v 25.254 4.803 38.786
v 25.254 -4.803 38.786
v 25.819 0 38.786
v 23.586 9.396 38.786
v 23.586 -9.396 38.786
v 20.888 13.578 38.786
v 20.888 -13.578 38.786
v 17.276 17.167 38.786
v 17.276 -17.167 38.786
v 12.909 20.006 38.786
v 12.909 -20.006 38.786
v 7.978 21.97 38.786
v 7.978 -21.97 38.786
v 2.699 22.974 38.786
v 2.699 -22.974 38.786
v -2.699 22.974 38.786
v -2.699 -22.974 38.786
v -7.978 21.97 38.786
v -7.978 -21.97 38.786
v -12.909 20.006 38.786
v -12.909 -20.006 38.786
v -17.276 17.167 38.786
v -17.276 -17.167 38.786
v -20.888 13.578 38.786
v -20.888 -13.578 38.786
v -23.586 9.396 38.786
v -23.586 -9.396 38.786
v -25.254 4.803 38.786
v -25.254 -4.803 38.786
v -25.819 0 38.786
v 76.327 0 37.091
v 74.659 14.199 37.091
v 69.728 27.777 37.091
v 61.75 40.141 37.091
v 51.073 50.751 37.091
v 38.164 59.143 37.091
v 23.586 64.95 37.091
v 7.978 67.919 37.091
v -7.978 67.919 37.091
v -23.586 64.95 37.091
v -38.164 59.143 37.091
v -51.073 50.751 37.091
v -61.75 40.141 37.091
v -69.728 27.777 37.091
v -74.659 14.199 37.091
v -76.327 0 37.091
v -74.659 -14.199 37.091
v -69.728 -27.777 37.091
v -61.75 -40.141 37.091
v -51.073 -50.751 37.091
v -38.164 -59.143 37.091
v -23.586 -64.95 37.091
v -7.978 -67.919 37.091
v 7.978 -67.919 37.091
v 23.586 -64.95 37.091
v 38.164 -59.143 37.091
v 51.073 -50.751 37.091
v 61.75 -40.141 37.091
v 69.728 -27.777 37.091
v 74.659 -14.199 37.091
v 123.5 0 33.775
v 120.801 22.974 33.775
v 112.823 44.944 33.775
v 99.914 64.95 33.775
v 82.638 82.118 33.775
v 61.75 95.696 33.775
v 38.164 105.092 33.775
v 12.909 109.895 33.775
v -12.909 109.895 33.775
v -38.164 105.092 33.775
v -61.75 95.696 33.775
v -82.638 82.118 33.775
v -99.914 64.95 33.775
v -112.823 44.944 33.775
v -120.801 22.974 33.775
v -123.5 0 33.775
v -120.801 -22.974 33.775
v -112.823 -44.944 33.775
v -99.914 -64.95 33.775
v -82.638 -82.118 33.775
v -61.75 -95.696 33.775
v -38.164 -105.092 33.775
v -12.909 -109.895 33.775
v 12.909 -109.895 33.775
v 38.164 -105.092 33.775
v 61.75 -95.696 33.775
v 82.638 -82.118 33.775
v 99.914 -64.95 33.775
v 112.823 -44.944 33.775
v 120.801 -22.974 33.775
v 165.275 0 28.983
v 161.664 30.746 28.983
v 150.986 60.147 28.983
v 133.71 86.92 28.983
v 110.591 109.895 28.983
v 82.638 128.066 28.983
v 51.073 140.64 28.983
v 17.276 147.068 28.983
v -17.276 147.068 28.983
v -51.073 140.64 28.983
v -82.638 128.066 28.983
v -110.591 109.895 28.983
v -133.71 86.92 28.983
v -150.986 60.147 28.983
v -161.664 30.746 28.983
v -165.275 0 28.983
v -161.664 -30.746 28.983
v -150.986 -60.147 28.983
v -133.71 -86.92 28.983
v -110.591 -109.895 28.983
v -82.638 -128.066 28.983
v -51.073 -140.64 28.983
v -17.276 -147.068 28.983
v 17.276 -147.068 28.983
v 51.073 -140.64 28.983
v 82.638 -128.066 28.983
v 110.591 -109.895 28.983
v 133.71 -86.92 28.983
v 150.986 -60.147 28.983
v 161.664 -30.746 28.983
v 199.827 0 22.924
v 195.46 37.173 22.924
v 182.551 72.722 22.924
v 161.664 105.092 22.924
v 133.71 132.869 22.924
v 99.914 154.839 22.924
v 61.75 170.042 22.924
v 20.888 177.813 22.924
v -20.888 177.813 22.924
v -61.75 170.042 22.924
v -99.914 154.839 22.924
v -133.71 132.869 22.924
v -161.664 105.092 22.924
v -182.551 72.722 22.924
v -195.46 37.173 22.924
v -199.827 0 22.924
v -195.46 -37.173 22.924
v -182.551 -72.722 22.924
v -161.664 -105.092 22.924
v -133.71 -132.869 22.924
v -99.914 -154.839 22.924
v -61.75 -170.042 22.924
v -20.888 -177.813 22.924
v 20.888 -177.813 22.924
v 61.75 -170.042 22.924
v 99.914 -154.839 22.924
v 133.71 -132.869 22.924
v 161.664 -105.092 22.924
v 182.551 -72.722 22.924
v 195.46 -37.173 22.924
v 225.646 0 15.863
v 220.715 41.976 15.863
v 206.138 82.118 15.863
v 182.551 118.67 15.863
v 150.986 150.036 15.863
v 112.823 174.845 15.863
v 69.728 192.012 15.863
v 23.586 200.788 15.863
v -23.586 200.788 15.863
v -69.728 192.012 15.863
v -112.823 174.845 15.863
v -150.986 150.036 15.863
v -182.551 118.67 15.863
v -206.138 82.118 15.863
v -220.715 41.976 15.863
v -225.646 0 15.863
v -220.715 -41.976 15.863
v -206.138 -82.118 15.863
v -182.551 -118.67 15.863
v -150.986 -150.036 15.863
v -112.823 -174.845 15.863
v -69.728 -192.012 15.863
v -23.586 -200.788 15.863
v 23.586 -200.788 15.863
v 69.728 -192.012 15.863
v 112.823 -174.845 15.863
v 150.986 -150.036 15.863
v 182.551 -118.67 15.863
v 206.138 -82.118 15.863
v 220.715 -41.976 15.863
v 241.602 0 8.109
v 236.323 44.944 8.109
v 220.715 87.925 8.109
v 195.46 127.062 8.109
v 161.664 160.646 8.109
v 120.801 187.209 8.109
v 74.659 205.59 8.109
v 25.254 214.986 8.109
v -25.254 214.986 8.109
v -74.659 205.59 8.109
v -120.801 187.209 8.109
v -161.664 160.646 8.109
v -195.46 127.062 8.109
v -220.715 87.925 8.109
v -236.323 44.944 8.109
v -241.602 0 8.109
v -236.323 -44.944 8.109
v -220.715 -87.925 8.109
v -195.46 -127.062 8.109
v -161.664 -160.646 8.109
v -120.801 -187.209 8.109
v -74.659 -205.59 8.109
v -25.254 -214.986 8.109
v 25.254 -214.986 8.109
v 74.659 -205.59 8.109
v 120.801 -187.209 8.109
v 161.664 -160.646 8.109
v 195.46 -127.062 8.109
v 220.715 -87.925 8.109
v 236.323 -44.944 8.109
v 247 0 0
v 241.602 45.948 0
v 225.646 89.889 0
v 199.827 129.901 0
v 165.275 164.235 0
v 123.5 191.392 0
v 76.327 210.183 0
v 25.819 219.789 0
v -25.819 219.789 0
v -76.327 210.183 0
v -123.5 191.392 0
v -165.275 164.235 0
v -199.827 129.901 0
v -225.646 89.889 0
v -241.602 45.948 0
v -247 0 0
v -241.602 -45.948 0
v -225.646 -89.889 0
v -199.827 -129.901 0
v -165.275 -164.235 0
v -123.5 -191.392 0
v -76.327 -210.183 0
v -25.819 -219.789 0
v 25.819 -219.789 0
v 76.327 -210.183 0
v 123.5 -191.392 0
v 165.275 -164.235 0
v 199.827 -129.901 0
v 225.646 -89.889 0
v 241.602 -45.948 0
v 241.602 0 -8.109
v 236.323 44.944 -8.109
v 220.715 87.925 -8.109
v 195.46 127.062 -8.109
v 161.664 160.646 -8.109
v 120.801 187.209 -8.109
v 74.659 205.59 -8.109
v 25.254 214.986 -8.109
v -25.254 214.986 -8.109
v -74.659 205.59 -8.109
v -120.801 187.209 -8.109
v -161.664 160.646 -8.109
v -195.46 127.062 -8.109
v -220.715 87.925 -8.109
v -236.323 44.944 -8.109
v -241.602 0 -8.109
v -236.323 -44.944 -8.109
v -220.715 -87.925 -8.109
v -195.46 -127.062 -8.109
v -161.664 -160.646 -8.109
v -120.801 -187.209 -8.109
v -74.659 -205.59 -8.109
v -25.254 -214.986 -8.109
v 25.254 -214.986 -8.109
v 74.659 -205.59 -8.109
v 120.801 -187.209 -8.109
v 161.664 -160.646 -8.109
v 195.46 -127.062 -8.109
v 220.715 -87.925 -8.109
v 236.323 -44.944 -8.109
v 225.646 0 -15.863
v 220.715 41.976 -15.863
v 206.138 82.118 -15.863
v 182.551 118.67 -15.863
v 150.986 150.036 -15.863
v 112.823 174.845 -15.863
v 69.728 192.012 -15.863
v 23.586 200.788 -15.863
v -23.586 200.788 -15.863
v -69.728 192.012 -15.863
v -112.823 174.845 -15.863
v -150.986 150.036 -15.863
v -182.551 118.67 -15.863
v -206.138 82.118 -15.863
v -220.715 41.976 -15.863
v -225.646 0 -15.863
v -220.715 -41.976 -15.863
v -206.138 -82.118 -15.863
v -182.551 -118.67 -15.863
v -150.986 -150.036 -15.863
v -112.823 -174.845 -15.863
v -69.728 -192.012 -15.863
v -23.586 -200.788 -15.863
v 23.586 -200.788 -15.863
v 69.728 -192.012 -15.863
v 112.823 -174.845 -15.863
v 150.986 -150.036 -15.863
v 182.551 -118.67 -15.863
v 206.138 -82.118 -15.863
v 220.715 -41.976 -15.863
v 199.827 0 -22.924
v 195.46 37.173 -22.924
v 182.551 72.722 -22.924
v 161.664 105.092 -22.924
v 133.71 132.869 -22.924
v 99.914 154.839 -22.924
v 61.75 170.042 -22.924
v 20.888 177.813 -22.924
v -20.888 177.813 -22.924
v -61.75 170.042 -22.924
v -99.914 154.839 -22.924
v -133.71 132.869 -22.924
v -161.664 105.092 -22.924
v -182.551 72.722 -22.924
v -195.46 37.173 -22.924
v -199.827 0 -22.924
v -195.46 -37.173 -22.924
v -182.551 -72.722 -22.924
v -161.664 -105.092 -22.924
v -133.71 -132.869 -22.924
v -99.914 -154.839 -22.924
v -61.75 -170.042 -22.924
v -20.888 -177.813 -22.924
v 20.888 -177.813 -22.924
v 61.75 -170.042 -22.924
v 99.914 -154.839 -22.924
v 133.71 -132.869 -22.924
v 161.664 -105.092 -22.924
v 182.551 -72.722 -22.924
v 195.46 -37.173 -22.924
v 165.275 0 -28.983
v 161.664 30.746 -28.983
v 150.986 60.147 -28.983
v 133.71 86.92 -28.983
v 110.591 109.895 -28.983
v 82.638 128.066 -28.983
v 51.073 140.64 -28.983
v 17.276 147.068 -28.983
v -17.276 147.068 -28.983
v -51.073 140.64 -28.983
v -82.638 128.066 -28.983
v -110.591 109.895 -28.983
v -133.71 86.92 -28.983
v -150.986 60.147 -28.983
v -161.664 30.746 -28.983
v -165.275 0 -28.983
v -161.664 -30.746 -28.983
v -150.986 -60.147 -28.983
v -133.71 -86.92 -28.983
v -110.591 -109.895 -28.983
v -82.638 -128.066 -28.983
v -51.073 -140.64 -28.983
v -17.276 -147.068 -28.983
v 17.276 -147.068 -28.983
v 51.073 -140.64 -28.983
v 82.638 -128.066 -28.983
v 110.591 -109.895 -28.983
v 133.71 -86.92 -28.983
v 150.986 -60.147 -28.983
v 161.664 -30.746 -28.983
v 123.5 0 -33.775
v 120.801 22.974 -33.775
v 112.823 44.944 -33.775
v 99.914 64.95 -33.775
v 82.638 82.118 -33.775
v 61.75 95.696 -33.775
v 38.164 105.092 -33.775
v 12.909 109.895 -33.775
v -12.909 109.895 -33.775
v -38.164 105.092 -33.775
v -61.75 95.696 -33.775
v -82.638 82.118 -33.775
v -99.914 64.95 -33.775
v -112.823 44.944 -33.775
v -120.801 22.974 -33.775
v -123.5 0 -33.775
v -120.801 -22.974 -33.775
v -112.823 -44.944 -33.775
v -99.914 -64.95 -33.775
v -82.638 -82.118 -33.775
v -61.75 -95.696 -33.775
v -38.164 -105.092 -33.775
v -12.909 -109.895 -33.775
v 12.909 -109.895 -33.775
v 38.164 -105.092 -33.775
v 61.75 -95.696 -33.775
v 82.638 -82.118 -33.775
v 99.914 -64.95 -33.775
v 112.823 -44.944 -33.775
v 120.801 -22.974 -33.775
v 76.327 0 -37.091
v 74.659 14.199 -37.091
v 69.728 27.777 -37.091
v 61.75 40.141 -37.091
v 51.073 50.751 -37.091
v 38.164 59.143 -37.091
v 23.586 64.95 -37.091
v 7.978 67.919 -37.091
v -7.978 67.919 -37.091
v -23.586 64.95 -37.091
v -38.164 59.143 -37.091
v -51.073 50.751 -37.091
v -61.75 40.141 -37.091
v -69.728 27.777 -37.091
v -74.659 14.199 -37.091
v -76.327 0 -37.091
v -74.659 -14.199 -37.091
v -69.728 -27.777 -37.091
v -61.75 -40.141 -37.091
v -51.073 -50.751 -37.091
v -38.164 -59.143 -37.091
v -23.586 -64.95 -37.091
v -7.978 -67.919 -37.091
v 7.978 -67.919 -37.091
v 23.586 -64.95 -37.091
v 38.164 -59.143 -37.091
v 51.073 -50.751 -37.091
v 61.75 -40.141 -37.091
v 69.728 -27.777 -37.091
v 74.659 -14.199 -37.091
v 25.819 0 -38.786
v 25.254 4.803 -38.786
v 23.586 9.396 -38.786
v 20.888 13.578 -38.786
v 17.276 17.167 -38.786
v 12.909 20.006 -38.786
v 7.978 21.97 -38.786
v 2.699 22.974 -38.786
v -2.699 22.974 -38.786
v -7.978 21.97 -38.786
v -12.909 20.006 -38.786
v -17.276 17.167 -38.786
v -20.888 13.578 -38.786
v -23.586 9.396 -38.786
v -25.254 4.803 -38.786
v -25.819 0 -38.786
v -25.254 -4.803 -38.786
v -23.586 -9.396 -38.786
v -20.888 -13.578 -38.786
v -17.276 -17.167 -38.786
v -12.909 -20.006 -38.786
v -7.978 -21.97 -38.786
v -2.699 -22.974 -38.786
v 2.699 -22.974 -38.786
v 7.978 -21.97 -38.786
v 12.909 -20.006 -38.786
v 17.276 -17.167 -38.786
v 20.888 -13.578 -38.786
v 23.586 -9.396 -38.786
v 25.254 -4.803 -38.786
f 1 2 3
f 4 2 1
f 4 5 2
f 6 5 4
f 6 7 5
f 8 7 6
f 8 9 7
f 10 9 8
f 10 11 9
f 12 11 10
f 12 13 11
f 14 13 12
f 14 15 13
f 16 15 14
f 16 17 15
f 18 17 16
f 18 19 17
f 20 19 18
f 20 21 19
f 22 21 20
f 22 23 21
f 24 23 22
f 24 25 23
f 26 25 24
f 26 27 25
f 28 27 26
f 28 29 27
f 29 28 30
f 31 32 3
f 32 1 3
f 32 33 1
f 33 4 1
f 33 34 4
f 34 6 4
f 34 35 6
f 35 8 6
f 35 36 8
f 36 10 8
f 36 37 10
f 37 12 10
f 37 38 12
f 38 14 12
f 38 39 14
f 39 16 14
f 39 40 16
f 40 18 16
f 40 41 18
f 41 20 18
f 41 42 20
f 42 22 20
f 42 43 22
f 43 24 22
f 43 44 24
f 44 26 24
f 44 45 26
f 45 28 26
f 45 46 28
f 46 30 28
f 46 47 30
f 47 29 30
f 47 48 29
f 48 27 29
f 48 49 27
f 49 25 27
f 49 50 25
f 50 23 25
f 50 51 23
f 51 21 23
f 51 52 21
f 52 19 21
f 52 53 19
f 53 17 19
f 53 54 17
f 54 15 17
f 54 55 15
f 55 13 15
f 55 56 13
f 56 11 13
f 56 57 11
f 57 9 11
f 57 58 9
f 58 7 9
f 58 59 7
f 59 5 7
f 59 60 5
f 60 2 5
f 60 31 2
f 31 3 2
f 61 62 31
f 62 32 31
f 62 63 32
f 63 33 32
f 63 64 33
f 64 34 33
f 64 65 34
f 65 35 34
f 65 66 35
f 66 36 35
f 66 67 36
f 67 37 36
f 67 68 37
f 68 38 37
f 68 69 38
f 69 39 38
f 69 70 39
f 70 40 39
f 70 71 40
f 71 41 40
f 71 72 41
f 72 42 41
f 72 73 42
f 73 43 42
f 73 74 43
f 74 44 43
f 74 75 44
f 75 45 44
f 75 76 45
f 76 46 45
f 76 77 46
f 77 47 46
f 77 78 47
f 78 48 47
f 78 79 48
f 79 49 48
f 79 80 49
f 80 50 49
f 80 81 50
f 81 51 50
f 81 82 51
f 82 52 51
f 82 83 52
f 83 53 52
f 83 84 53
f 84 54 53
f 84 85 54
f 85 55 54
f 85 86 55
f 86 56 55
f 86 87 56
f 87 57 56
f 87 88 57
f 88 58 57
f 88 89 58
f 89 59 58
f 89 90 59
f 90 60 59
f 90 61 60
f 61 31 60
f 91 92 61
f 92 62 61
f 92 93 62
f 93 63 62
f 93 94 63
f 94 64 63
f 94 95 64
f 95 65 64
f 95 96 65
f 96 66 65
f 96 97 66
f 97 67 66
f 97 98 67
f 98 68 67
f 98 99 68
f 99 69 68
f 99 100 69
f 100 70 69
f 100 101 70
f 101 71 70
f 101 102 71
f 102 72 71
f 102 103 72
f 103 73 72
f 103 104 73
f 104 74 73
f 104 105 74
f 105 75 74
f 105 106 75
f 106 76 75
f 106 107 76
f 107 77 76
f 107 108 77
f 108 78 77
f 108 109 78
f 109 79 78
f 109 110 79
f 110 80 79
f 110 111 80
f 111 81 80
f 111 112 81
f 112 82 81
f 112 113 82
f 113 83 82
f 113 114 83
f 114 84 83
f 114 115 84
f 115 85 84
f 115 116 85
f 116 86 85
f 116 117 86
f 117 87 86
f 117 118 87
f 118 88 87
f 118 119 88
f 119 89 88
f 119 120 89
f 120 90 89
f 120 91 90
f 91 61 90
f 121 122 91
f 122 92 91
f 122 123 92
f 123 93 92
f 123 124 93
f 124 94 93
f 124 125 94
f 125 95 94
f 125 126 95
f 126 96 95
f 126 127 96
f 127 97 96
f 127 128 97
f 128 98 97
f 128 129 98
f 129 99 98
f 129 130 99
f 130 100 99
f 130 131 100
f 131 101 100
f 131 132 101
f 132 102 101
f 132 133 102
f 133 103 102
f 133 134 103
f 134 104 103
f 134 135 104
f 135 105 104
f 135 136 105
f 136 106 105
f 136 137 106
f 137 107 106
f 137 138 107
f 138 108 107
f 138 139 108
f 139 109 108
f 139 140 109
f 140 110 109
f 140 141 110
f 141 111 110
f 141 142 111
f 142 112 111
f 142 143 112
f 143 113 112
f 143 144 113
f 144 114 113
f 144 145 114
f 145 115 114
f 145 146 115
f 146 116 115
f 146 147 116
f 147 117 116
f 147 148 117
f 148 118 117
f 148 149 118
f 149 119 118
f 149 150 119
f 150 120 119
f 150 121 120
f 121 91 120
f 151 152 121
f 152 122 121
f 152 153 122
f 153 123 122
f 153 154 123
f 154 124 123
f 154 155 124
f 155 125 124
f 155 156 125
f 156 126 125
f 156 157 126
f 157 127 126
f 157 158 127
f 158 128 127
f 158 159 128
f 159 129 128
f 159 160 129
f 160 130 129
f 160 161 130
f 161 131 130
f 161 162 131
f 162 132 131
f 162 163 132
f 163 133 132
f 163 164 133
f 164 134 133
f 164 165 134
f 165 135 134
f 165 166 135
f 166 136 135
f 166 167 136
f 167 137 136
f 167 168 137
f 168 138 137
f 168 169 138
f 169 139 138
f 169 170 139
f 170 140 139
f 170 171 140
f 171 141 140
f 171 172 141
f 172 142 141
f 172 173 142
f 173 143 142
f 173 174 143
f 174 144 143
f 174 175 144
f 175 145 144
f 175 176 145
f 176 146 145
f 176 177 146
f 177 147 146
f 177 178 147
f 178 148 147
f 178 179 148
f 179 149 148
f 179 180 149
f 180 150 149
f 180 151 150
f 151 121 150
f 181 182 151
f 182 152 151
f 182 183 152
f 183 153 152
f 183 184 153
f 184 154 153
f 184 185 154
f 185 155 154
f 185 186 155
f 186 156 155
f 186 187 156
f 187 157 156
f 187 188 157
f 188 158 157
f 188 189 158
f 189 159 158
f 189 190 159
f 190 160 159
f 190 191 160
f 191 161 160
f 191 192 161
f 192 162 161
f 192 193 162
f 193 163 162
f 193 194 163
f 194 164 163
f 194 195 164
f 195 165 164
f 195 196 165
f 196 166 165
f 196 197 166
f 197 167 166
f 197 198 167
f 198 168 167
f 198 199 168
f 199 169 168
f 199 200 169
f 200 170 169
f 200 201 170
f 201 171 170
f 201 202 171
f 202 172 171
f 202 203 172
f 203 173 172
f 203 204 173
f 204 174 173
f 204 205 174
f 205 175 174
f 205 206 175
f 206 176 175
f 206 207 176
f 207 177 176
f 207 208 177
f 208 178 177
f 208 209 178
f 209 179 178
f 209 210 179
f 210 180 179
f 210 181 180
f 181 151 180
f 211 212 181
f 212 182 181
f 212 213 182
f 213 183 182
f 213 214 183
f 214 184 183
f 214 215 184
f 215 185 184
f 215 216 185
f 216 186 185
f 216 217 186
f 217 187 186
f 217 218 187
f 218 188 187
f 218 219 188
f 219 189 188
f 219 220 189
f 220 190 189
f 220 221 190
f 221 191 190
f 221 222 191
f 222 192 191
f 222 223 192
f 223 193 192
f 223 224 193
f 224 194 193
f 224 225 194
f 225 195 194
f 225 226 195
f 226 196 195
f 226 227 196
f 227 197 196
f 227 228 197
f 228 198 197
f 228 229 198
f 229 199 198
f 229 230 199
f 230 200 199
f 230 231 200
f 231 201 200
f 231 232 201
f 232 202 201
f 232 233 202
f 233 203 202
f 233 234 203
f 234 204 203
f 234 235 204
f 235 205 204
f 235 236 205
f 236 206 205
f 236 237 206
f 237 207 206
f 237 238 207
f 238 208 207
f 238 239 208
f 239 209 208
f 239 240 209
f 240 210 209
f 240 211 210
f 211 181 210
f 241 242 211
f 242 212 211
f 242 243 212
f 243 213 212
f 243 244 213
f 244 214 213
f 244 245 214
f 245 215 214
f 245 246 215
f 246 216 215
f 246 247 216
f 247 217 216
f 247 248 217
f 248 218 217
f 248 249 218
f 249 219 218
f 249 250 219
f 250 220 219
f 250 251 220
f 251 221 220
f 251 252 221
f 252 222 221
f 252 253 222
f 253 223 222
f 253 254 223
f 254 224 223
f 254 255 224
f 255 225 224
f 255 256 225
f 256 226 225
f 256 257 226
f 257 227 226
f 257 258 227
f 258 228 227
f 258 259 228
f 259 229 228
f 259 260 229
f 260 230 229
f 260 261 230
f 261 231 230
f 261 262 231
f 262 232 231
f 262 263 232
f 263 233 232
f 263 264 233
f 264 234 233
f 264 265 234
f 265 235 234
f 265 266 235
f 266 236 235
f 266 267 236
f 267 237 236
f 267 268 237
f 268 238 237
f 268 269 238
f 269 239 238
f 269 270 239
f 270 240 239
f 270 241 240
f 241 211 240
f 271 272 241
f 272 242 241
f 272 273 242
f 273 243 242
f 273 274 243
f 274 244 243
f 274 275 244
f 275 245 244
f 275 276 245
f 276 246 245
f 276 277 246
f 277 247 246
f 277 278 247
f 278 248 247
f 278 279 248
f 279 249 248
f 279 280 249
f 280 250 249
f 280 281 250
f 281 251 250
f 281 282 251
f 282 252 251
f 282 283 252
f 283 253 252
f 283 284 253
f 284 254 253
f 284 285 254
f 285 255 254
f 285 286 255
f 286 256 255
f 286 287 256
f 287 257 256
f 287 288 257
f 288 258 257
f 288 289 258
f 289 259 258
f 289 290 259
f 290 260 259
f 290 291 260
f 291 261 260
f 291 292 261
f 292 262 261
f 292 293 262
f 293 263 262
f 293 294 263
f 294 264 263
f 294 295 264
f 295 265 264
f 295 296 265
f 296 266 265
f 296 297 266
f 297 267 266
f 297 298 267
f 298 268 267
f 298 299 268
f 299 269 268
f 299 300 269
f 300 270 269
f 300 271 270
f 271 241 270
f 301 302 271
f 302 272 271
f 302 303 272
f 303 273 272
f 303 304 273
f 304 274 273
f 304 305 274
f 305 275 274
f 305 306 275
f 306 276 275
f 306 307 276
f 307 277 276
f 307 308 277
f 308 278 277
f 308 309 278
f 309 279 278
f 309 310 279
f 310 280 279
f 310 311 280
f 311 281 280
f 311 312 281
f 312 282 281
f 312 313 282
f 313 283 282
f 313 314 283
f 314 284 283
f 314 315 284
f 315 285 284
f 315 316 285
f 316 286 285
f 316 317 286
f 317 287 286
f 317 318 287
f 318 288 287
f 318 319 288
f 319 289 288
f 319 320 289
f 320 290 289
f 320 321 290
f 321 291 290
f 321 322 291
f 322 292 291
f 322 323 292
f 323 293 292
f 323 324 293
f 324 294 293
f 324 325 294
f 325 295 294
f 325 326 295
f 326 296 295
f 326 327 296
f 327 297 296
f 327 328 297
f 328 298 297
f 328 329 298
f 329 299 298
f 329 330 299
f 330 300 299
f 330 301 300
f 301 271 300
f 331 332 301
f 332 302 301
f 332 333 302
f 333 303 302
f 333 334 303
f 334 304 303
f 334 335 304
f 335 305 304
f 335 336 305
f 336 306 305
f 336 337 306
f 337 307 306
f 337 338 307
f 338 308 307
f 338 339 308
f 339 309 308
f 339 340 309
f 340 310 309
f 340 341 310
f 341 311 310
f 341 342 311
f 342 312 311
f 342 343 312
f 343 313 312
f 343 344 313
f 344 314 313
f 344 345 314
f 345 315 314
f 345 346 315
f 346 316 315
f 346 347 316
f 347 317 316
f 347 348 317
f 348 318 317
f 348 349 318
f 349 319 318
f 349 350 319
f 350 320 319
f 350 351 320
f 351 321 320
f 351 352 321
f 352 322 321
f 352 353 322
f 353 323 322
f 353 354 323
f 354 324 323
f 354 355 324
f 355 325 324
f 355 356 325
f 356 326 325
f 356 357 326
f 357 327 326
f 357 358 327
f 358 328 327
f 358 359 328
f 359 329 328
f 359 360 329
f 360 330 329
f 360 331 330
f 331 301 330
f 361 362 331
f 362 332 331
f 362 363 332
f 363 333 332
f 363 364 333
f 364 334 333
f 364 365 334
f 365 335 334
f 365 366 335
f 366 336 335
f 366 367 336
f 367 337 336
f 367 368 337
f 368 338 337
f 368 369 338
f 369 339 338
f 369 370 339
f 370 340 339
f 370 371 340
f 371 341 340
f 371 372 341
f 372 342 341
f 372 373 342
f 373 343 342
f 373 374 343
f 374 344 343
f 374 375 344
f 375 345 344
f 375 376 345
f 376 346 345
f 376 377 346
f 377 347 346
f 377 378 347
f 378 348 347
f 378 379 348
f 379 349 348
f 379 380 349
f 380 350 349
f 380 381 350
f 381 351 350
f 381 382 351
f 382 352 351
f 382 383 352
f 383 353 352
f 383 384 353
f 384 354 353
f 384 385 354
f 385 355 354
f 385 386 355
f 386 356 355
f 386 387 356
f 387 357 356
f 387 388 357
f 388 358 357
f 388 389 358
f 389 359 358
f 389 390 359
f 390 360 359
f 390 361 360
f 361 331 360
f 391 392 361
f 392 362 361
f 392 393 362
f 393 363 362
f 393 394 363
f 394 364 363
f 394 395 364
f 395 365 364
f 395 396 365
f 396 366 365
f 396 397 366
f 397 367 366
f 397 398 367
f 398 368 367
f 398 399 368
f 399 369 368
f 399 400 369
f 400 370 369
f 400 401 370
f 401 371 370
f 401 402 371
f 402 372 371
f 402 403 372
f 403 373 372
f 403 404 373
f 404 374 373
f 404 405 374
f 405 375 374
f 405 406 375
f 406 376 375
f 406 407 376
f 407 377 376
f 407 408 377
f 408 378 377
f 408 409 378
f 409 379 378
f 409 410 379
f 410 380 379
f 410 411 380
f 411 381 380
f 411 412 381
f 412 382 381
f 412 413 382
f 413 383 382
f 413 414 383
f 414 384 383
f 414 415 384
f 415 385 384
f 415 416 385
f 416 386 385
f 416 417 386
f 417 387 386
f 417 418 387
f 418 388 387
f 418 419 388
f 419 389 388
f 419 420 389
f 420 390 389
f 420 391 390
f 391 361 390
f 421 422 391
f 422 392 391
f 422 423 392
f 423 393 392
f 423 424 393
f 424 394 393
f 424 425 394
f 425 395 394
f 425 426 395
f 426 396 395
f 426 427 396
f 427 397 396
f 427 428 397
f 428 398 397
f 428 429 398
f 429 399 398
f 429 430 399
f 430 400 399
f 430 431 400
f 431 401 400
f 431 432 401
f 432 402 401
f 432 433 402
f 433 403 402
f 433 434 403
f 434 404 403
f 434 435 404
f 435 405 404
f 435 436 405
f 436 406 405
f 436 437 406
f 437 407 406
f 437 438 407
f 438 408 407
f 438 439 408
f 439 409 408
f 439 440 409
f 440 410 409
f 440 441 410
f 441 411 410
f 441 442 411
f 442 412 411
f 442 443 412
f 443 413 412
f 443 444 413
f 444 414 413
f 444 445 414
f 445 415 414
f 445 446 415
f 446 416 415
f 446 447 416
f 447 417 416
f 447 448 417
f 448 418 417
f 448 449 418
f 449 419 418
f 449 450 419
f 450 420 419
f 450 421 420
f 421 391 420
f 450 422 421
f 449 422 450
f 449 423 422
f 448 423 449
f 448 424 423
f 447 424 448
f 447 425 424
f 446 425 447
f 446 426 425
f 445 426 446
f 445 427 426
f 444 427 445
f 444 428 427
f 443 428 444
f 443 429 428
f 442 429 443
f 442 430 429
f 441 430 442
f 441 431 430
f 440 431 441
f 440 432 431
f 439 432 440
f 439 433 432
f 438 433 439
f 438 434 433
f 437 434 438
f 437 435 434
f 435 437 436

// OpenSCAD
// Generated by SolidPython 1.0.1 on 2020-07-29 00:46:54


scale(v = [19, 17, 3]) {
	sphere(r = 13);
}
/***********************************************
*********      SolidPython code:      **********
************************************************
 
# import packages: SolidPython
from solid import *
from solid.utils import *
from itertools import chain, combinations, permutations


class Resize:

    def __init__(self, scad_file):
        self.scad_file = scad_file
        #self.scad_file = import_scad(scad_file)
        # cone/cylinder param:
        self.r1 = 0
        self.r2 = 0
        self.h = 0
        # rectangular prism param:
        self.w = 0
        self.l = 0
        # ellipse param:
        self.r = 0

    # import OpenScad code (file name corresponds to shape)


    # classify shape + parameters
    def assign(self, param1, param2, param3):
        if self.scad_file == 'cone.scad':
            self.r1 = param1
            self.r2 = param2
            self.h = param3
        elif self.scad_file == 'cylinder.scad':
            self.r1 = param1
            self.r2 = param2
            self.h = param3
        elif self.scad_file == 'rectangularPrism.scad':
            self.h = param1
            self.l = param2
            self.w = param3
        else:
            self.r = param1
            self.h = param2

    # resize parameters
    def iterate(self):
        x = range(3, 20, 2)
        i = 1
        if self.scad_file == 'cone.scad':
            tempList = list(permutations(x, 2))
            for temp in tempList:
                param1 = temp[0]
                param2 = temp[1]
                filepath = 'produced_scad_files/' + 'cone' + str(param1) + '_' + str(param2) + '_' + '.scad'
                scad_render_to_file(cylinder(h=param1, r1=param2, r2=0), filepath)

        elif self.scad_file == 'cylinder.scad':
            tempList = list(permutations(x, 3))
            for temp in tempList:
                param1 = temp[0]
                param2 = temp[1]
                filepath = 'produced_scad_files/' + 'cylinder' + str(param1) + '_' + str(param2) + '_' + '.scad'
                scad_render_to_file(cylinder(h=param1, r1=param2, r2=param2), filepath)

        elif self.scad_file == 'rectangularPrism.scad':
            tempList = list(permutations(x, 3))
            for temp in tempList:
                param1 = temp[0]
                param2 = temp[1]
                param3 = temp[2]
                filepath = 'produced_scad_files/' + 'rectangularPrism' + str(param1) + '_' + str(param2) + '_' + str(
                    param3) + '.scad'
                scad_render_to_file(cube(size=(param1, param2, param3)), filepath)

        elif self.scad_file == 'ellipse.scad':
            tempList = list(permutations(x, 4))
            for temp in tempList:
                param1 = temp[0]
                param2 = temp[1]
                param3 = temp[2]
                param4 = temp[3]
                filepath = 'produced_scad_files/' + 'ellipse' + str(param1) + '_' + str(param2) + '_' + str(param3) + '_' + str(param4) + '.scad'
                scad_render_to_file(scale([param1, param2, param3])(sphere(r=param4)), filepath)

    def render_to_scadfile(self):
        scad_render_to_file(scad, 'example.scad') 
 
************************************************/
